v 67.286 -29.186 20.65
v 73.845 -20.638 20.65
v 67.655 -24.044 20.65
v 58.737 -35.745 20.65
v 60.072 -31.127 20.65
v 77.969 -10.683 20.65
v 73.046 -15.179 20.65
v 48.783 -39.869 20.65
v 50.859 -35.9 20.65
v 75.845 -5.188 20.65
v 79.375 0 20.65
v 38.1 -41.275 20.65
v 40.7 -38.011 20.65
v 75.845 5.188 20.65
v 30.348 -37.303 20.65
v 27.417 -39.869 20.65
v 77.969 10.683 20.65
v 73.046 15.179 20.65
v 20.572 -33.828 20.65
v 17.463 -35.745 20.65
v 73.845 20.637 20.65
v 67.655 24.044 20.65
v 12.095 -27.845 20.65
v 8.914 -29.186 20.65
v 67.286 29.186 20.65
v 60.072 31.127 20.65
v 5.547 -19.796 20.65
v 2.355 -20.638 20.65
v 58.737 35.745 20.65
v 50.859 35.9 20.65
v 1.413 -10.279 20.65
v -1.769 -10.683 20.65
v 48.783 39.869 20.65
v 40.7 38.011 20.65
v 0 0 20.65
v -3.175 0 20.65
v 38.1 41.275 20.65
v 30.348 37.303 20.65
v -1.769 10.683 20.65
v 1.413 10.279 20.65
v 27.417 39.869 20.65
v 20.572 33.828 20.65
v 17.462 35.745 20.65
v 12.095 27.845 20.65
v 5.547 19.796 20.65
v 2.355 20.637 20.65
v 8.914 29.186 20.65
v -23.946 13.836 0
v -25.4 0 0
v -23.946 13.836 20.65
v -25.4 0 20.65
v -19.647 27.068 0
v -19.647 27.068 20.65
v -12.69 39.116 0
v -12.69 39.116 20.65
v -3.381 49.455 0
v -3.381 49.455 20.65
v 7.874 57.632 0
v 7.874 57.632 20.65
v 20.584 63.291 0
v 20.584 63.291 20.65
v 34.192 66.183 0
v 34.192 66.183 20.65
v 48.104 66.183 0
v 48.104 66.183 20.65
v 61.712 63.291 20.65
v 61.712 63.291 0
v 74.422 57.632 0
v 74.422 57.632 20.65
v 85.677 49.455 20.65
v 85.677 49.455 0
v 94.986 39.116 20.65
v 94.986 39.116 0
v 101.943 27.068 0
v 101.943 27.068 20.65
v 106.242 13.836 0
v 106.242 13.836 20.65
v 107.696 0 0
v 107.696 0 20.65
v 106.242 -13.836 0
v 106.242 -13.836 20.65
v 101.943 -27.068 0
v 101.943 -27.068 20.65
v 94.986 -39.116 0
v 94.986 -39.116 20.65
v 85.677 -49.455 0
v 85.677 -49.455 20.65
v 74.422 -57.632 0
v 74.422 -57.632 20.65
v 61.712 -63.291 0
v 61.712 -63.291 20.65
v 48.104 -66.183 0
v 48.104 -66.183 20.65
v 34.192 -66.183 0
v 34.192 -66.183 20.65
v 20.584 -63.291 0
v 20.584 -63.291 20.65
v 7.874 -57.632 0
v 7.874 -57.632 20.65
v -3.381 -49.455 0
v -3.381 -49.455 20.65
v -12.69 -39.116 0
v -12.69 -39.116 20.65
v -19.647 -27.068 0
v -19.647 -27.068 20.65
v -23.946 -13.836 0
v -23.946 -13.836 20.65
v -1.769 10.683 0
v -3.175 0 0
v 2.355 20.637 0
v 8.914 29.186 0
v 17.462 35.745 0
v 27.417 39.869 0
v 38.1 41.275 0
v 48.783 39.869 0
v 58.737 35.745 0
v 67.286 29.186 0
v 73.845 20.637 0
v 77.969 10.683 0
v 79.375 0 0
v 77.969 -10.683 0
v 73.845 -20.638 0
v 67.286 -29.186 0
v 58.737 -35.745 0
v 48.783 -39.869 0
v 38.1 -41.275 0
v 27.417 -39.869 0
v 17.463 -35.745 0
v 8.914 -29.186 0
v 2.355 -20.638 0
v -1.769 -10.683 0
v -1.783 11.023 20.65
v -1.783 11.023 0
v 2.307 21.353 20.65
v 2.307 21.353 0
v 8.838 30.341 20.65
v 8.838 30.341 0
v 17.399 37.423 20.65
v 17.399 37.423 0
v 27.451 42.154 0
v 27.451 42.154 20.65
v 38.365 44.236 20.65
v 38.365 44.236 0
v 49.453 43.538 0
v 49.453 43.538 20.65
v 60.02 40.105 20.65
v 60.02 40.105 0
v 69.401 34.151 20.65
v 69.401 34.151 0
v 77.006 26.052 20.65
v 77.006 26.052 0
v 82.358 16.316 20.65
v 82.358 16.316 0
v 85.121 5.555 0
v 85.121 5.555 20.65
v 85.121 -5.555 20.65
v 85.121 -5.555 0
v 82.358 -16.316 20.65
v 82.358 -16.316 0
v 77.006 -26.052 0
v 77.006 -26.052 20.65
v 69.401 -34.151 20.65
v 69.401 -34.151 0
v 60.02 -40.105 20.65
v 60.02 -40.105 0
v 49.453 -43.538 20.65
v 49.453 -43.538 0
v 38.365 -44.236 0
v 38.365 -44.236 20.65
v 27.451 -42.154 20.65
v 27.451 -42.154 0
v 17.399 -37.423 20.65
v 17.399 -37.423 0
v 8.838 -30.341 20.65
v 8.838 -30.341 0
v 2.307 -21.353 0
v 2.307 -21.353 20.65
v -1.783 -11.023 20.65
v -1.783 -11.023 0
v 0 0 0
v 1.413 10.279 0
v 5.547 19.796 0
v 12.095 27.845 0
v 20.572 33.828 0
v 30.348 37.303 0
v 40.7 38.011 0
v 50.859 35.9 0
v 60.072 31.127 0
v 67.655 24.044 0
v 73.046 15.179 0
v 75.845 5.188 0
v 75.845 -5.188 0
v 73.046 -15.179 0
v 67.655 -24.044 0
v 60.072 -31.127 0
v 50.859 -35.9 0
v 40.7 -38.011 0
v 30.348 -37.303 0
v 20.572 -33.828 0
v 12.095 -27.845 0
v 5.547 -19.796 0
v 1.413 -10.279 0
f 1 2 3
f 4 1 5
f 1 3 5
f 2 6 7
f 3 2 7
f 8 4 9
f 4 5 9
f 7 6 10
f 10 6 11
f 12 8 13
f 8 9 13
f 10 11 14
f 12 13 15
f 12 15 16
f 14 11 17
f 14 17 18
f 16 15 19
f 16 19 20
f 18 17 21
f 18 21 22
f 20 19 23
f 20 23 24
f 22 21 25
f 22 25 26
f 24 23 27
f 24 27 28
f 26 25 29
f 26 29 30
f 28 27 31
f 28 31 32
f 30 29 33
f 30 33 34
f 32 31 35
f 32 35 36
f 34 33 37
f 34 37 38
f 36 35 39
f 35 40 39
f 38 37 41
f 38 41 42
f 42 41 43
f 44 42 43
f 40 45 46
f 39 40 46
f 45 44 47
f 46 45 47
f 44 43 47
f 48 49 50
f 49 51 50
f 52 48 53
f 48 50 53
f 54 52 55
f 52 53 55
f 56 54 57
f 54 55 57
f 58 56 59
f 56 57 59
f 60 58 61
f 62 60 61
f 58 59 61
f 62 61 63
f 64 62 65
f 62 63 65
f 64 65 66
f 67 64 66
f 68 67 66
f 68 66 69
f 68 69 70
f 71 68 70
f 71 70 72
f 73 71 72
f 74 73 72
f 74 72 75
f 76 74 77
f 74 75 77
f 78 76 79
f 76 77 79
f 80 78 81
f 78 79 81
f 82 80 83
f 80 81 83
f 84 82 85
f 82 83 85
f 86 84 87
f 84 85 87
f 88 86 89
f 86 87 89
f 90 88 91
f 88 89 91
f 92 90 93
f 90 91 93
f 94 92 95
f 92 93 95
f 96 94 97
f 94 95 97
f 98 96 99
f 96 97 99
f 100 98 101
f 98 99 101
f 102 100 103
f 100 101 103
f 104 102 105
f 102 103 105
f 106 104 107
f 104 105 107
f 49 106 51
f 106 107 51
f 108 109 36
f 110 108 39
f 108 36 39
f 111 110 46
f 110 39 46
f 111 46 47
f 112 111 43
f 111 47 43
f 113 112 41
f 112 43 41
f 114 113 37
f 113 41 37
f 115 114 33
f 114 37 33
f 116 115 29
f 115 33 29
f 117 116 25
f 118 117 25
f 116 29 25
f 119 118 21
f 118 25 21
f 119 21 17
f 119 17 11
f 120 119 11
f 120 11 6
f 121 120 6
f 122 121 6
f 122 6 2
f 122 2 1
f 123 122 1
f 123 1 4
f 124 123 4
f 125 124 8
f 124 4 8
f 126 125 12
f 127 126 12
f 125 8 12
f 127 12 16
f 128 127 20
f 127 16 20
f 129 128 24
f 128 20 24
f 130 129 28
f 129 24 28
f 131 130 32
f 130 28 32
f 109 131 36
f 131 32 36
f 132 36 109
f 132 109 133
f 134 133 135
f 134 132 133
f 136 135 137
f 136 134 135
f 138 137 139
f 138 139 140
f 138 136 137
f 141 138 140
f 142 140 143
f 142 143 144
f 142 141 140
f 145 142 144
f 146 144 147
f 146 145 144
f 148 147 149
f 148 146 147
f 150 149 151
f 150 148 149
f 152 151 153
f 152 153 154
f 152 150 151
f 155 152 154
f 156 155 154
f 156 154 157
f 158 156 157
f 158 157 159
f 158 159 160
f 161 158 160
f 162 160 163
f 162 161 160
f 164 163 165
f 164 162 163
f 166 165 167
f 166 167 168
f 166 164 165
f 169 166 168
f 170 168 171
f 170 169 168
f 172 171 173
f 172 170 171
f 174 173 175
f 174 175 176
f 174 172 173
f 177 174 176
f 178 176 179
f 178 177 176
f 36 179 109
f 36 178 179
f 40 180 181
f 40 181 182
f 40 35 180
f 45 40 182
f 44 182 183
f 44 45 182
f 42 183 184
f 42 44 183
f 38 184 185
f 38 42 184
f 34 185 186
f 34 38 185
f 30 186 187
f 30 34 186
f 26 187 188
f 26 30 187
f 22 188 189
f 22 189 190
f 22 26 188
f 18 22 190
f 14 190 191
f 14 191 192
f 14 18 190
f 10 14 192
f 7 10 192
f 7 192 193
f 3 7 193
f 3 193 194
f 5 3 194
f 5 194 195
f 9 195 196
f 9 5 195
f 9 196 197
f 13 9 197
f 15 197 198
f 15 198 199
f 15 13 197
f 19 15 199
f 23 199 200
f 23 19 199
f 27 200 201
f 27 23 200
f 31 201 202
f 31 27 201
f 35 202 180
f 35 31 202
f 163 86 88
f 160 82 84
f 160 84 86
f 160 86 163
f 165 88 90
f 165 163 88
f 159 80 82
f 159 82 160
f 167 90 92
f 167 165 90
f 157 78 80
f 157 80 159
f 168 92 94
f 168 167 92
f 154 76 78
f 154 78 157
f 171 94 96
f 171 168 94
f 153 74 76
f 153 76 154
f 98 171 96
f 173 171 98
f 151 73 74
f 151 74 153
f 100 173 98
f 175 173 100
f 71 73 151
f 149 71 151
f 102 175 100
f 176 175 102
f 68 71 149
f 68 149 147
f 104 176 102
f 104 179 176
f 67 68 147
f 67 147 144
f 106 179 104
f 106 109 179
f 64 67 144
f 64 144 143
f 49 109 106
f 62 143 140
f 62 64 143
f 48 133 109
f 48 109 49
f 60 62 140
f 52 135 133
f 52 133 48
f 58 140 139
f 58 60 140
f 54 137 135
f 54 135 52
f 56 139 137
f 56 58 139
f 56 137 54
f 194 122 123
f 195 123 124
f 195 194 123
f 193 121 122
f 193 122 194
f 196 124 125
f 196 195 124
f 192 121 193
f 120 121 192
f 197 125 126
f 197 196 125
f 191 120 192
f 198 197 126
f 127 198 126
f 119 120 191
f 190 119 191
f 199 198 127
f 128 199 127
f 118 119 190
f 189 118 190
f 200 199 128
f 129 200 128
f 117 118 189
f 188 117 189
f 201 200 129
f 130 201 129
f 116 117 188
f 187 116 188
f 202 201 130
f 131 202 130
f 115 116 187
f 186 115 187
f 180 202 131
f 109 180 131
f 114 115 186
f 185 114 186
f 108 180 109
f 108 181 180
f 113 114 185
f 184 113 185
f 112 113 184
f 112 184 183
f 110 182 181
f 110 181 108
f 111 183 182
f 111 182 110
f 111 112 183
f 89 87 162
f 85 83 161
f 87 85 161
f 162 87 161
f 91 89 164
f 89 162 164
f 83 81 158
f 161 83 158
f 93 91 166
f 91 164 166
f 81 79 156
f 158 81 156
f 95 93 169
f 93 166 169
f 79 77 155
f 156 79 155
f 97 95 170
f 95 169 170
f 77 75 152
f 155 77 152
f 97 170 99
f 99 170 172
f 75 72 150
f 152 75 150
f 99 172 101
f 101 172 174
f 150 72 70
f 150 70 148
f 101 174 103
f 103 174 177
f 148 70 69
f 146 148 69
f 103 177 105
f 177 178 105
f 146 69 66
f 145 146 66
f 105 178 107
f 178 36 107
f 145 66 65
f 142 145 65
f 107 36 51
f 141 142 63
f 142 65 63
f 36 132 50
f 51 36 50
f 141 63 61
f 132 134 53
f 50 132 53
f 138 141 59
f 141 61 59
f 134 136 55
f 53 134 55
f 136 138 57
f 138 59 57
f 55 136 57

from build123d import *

# Parameters (mm, degrees)
F0_W = 3.175
F0_H = 20.6502
F1_W = 22.225
F1_H = 20.6502


with BuildPart() as f2:
    # F0 (on Front) → F2 (revolve)
    with BuildSketch(Plane.XZ):
        with Locations((-1.5875, 10.3251)):
            Rectangle(F0_W, F0_H)
    revolve(axis=Axis((38.1, 0, 3.615384), (0, 0, -1)))

    # F1 (on Front) → F3 (revolve)
    with BuildSketch(Plane.XZ):
        with Locations((-14.2875, 10.3251)):
            Rectangle(F1_W, F1_H)
    revolve(axis=Axis((41.148, 0, 9.431434), (0, 0, -1)))


solid = f2.part
